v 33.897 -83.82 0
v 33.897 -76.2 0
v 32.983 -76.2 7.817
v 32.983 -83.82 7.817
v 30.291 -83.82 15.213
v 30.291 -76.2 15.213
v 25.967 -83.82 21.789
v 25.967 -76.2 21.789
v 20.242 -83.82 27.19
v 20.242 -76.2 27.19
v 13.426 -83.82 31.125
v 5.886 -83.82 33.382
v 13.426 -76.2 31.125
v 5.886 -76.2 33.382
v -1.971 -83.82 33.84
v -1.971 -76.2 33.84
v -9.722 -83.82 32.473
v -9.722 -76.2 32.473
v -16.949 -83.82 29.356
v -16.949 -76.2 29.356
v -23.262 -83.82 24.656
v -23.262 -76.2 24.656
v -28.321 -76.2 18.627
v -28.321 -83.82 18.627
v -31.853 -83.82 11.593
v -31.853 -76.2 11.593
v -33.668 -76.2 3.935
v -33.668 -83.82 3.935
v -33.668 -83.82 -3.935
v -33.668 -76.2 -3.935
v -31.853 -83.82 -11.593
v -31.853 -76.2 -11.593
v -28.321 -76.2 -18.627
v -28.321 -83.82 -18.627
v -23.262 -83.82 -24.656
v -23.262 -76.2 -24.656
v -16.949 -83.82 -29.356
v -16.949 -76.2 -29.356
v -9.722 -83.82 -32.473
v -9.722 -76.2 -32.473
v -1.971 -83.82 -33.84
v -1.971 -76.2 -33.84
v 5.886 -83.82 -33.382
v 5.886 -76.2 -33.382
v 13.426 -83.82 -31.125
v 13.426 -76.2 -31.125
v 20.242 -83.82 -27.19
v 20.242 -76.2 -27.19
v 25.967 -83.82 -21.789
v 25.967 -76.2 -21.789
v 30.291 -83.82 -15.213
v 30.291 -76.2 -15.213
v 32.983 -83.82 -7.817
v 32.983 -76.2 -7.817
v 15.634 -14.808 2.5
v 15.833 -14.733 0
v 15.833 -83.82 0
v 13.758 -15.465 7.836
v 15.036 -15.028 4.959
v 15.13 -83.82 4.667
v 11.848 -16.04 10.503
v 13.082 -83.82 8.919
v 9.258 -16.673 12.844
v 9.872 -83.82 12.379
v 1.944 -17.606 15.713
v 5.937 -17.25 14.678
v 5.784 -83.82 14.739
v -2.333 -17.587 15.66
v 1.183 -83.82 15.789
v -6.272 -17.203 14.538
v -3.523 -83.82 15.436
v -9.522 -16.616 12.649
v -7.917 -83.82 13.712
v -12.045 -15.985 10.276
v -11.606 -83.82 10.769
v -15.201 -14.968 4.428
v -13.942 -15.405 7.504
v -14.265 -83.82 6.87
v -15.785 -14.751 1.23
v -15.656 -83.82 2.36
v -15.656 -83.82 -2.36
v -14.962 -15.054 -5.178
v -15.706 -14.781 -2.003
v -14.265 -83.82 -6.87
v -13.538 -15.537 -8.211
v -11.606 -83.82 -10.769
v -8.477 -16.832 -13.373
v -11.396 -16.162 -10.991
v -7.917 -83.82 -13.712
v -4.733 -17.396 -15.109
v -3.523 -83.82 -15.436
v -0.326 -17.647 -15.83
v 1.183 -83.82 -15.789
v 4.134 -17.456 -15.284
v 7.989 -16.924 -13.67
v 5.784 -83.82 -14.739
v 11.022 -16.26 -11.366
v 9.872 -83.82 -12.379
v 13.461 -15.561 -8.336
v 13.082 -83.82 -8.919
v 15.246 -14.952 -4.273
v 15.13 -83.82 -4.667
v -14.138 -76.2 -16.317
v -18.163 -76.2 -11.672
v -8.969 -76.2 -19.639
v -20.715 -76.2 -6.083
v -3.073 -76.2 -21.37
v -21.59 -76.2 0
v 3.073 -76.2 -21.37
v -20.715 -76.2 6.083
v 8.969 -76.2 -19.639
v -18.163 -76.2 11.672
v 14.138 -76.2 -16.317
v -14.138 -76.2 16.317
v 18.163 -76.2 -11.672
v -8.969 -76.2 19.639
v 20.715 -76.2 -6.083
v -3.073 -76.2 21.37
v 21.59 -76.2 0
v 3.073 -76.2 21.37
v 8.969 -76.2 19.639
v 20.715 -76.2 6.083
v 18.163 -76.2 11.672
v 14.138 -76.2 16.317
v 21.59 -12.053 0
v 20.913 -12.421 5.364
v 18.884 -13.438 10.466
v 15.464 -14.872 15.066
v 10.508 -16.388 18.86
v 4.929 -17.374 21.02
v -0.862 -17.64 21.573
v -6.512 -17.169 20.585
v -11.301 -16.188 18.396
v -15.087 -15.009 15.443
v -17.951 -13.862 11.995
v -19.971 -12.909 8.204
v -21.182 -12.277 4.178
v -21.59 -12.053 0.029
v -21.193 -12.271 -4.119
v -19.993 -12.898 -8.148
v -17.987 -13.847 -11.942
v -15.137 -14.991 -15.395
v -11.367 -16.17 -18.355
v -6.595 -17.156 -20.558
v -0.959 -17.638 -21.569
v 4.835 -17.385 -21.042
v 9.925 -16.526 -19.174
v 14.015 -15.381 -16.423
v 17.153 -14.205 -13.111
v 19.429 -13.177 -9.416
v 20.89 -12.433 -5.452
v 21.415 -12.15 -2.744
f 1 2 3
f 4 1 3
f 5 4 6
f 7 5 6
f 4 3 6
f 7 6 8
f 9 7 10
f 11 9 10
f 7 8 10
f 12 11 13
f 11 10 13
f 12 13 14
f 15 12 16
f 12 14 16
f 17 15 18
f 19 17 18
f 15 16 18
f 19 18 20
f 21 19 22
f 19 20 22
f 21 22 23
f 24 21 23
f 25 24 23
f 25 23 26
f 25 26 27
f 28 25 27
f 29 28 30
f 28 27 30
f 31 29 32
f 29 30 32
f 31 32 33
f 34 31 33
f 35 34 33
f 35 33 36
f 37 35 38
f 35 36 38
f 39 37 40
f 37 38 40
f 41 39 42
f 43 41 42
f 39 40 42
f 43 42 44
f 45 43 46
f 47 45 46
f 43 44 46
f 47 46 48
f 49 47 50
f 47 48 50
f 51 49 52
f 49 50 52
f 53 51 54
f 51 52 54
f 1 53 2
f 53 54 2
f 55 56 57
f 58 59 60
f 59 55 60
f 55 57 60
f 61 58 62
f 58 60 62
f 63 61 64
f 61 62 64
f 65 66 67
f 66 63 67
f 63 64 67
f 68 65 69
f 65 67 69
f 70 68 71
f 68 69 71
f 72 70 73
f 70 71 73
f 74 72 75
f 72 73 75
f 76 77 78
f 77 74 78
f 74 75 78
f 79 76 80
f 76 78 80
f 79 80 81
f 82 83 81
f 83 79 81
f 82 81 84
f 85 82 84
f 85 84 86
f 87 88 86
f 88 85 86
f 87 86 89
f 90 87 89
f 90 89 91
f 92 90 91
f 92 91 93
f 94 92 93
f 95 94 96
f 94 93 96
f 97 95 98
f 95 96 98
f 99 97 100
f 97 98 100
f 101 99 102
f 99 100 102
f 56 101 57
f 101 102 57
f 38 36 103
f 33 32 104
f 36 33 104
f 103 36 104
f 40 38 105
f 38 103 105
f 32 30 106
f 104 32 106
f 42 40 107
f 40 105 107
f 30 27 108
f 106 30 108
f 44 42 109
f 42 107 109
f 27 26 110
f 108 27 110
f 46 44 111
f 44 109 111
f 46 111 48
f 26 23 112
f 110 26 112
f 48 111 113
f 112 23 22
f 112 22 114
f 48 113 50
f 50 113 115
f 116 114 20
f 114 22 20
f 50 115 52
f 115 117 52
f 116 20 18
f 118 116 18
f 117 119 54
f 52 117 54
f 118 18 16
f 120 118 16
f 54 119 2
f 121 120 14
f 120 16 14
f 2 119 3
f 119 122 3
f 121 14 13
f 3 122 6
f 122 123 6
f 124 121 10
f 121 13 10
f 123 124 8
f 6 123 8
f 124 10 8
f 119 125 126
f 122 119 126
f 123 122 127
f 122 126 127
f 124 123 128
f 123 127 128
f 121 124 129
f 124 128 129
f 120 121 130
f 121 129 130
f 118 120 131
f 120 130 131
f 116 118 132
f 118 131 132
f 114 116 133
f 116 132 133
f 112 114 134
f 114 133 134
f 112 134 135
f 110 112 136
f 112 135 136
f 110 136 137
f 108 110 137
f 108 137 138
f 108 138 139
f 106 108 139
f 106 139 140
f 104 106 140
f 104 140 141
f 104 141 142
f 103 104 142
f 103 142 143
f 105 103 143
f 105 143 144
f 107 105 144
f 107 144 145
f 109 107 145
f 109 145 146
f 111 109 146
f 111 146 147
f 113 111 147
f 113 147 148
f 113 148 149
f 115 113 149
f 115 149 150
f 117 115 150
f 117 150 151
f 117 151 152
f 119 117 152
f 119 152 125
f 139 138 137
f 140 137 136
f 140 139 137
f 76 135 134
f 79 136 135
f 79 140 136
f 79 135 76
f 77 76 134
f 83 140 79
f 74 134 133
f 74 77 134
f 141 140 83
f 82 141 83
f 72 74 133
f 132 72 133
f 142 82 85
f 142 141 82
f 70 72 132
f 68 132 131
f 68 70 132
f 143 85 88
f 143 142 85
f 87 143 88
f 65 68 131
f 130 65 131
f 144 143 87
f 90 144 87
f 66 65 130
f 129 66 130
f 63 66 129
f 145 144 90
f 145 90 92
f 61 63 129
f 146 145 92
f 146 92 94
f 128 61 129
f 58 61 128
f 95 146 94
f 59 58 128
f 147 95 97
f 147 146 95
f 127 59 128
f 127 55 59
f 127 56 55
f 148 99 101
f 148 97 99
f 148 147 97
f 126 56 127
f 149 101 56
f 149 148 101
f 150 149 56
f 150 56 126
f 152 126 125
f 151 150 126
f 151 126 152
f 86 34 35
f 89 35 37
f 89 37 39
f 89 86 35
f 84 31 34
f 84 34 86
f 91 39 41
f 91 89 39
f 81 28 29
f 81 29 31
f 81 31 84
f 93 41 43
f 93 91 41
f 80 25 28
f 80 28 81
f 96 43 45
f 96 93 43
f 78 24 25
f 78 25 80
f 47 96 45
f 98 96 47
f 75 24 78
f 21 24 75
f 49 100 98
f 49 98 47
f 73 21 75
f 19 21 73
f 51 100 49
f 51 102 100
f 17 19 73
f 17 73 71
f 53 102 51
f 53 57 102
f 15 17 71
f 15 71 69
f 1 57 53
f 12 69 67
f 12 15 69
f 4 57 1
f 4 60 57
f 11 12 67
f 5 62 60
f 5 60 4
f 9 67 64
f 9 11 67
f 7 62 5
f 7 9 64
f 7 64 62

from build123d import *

# Parameters (mm, degrees)
F0_R          = 21.59
F1_DEPTH      = 76.2
F2_R          = 33.897036
F2_R_2        = 21.59
F3_DEPTH      = 7.62
F4_R          = 15.833015
F5_DEPTH      = 83.821
F6_R          = 44.45
F7_DEPTH      = 25.4
F7_DEPTH_BACK = 38.4834


with BuildPart() as f1:
    # F0 (on Front) → F1 (new body)
    with BuildSketch(Plane.XZ):
        Circle(F0_R)
    extrude(amount=F1_DEPTH)

    # F2 (on face) → F3 (join)
    with BuildSketch(Plane.XZ.offset(76.2)):
        Circle(F2_R)
        Circle(F2_R_2, mode=Mode.SUBTRACT)
        Circle(F2_R_2)
    extrude(amount=F3_DEPTH)

    # F4 (on face) → F5 (cut, through all)
    with BuildSketch(Plane.XZ.offset(83.82)):
        Circle(F4_R)
    extrude(amount=-F5_DEPTH, mode=Mode.SUBTRACT)

    # F6 (on Top) → F7 (cut, two sides)
    with BuildSketch(Plane.XY) as f7_sk:
        with Locations((0, 26.801758)):
            Circle(F6_R)
    extrude(amount=F7_DEPTH, mode=Mode.SUBTRACT)
    extrude(f7_sk.sketch, amount=-F7_DEPTH_BACK, mode=Mode.SUBTRACT)


solid = f1.part
